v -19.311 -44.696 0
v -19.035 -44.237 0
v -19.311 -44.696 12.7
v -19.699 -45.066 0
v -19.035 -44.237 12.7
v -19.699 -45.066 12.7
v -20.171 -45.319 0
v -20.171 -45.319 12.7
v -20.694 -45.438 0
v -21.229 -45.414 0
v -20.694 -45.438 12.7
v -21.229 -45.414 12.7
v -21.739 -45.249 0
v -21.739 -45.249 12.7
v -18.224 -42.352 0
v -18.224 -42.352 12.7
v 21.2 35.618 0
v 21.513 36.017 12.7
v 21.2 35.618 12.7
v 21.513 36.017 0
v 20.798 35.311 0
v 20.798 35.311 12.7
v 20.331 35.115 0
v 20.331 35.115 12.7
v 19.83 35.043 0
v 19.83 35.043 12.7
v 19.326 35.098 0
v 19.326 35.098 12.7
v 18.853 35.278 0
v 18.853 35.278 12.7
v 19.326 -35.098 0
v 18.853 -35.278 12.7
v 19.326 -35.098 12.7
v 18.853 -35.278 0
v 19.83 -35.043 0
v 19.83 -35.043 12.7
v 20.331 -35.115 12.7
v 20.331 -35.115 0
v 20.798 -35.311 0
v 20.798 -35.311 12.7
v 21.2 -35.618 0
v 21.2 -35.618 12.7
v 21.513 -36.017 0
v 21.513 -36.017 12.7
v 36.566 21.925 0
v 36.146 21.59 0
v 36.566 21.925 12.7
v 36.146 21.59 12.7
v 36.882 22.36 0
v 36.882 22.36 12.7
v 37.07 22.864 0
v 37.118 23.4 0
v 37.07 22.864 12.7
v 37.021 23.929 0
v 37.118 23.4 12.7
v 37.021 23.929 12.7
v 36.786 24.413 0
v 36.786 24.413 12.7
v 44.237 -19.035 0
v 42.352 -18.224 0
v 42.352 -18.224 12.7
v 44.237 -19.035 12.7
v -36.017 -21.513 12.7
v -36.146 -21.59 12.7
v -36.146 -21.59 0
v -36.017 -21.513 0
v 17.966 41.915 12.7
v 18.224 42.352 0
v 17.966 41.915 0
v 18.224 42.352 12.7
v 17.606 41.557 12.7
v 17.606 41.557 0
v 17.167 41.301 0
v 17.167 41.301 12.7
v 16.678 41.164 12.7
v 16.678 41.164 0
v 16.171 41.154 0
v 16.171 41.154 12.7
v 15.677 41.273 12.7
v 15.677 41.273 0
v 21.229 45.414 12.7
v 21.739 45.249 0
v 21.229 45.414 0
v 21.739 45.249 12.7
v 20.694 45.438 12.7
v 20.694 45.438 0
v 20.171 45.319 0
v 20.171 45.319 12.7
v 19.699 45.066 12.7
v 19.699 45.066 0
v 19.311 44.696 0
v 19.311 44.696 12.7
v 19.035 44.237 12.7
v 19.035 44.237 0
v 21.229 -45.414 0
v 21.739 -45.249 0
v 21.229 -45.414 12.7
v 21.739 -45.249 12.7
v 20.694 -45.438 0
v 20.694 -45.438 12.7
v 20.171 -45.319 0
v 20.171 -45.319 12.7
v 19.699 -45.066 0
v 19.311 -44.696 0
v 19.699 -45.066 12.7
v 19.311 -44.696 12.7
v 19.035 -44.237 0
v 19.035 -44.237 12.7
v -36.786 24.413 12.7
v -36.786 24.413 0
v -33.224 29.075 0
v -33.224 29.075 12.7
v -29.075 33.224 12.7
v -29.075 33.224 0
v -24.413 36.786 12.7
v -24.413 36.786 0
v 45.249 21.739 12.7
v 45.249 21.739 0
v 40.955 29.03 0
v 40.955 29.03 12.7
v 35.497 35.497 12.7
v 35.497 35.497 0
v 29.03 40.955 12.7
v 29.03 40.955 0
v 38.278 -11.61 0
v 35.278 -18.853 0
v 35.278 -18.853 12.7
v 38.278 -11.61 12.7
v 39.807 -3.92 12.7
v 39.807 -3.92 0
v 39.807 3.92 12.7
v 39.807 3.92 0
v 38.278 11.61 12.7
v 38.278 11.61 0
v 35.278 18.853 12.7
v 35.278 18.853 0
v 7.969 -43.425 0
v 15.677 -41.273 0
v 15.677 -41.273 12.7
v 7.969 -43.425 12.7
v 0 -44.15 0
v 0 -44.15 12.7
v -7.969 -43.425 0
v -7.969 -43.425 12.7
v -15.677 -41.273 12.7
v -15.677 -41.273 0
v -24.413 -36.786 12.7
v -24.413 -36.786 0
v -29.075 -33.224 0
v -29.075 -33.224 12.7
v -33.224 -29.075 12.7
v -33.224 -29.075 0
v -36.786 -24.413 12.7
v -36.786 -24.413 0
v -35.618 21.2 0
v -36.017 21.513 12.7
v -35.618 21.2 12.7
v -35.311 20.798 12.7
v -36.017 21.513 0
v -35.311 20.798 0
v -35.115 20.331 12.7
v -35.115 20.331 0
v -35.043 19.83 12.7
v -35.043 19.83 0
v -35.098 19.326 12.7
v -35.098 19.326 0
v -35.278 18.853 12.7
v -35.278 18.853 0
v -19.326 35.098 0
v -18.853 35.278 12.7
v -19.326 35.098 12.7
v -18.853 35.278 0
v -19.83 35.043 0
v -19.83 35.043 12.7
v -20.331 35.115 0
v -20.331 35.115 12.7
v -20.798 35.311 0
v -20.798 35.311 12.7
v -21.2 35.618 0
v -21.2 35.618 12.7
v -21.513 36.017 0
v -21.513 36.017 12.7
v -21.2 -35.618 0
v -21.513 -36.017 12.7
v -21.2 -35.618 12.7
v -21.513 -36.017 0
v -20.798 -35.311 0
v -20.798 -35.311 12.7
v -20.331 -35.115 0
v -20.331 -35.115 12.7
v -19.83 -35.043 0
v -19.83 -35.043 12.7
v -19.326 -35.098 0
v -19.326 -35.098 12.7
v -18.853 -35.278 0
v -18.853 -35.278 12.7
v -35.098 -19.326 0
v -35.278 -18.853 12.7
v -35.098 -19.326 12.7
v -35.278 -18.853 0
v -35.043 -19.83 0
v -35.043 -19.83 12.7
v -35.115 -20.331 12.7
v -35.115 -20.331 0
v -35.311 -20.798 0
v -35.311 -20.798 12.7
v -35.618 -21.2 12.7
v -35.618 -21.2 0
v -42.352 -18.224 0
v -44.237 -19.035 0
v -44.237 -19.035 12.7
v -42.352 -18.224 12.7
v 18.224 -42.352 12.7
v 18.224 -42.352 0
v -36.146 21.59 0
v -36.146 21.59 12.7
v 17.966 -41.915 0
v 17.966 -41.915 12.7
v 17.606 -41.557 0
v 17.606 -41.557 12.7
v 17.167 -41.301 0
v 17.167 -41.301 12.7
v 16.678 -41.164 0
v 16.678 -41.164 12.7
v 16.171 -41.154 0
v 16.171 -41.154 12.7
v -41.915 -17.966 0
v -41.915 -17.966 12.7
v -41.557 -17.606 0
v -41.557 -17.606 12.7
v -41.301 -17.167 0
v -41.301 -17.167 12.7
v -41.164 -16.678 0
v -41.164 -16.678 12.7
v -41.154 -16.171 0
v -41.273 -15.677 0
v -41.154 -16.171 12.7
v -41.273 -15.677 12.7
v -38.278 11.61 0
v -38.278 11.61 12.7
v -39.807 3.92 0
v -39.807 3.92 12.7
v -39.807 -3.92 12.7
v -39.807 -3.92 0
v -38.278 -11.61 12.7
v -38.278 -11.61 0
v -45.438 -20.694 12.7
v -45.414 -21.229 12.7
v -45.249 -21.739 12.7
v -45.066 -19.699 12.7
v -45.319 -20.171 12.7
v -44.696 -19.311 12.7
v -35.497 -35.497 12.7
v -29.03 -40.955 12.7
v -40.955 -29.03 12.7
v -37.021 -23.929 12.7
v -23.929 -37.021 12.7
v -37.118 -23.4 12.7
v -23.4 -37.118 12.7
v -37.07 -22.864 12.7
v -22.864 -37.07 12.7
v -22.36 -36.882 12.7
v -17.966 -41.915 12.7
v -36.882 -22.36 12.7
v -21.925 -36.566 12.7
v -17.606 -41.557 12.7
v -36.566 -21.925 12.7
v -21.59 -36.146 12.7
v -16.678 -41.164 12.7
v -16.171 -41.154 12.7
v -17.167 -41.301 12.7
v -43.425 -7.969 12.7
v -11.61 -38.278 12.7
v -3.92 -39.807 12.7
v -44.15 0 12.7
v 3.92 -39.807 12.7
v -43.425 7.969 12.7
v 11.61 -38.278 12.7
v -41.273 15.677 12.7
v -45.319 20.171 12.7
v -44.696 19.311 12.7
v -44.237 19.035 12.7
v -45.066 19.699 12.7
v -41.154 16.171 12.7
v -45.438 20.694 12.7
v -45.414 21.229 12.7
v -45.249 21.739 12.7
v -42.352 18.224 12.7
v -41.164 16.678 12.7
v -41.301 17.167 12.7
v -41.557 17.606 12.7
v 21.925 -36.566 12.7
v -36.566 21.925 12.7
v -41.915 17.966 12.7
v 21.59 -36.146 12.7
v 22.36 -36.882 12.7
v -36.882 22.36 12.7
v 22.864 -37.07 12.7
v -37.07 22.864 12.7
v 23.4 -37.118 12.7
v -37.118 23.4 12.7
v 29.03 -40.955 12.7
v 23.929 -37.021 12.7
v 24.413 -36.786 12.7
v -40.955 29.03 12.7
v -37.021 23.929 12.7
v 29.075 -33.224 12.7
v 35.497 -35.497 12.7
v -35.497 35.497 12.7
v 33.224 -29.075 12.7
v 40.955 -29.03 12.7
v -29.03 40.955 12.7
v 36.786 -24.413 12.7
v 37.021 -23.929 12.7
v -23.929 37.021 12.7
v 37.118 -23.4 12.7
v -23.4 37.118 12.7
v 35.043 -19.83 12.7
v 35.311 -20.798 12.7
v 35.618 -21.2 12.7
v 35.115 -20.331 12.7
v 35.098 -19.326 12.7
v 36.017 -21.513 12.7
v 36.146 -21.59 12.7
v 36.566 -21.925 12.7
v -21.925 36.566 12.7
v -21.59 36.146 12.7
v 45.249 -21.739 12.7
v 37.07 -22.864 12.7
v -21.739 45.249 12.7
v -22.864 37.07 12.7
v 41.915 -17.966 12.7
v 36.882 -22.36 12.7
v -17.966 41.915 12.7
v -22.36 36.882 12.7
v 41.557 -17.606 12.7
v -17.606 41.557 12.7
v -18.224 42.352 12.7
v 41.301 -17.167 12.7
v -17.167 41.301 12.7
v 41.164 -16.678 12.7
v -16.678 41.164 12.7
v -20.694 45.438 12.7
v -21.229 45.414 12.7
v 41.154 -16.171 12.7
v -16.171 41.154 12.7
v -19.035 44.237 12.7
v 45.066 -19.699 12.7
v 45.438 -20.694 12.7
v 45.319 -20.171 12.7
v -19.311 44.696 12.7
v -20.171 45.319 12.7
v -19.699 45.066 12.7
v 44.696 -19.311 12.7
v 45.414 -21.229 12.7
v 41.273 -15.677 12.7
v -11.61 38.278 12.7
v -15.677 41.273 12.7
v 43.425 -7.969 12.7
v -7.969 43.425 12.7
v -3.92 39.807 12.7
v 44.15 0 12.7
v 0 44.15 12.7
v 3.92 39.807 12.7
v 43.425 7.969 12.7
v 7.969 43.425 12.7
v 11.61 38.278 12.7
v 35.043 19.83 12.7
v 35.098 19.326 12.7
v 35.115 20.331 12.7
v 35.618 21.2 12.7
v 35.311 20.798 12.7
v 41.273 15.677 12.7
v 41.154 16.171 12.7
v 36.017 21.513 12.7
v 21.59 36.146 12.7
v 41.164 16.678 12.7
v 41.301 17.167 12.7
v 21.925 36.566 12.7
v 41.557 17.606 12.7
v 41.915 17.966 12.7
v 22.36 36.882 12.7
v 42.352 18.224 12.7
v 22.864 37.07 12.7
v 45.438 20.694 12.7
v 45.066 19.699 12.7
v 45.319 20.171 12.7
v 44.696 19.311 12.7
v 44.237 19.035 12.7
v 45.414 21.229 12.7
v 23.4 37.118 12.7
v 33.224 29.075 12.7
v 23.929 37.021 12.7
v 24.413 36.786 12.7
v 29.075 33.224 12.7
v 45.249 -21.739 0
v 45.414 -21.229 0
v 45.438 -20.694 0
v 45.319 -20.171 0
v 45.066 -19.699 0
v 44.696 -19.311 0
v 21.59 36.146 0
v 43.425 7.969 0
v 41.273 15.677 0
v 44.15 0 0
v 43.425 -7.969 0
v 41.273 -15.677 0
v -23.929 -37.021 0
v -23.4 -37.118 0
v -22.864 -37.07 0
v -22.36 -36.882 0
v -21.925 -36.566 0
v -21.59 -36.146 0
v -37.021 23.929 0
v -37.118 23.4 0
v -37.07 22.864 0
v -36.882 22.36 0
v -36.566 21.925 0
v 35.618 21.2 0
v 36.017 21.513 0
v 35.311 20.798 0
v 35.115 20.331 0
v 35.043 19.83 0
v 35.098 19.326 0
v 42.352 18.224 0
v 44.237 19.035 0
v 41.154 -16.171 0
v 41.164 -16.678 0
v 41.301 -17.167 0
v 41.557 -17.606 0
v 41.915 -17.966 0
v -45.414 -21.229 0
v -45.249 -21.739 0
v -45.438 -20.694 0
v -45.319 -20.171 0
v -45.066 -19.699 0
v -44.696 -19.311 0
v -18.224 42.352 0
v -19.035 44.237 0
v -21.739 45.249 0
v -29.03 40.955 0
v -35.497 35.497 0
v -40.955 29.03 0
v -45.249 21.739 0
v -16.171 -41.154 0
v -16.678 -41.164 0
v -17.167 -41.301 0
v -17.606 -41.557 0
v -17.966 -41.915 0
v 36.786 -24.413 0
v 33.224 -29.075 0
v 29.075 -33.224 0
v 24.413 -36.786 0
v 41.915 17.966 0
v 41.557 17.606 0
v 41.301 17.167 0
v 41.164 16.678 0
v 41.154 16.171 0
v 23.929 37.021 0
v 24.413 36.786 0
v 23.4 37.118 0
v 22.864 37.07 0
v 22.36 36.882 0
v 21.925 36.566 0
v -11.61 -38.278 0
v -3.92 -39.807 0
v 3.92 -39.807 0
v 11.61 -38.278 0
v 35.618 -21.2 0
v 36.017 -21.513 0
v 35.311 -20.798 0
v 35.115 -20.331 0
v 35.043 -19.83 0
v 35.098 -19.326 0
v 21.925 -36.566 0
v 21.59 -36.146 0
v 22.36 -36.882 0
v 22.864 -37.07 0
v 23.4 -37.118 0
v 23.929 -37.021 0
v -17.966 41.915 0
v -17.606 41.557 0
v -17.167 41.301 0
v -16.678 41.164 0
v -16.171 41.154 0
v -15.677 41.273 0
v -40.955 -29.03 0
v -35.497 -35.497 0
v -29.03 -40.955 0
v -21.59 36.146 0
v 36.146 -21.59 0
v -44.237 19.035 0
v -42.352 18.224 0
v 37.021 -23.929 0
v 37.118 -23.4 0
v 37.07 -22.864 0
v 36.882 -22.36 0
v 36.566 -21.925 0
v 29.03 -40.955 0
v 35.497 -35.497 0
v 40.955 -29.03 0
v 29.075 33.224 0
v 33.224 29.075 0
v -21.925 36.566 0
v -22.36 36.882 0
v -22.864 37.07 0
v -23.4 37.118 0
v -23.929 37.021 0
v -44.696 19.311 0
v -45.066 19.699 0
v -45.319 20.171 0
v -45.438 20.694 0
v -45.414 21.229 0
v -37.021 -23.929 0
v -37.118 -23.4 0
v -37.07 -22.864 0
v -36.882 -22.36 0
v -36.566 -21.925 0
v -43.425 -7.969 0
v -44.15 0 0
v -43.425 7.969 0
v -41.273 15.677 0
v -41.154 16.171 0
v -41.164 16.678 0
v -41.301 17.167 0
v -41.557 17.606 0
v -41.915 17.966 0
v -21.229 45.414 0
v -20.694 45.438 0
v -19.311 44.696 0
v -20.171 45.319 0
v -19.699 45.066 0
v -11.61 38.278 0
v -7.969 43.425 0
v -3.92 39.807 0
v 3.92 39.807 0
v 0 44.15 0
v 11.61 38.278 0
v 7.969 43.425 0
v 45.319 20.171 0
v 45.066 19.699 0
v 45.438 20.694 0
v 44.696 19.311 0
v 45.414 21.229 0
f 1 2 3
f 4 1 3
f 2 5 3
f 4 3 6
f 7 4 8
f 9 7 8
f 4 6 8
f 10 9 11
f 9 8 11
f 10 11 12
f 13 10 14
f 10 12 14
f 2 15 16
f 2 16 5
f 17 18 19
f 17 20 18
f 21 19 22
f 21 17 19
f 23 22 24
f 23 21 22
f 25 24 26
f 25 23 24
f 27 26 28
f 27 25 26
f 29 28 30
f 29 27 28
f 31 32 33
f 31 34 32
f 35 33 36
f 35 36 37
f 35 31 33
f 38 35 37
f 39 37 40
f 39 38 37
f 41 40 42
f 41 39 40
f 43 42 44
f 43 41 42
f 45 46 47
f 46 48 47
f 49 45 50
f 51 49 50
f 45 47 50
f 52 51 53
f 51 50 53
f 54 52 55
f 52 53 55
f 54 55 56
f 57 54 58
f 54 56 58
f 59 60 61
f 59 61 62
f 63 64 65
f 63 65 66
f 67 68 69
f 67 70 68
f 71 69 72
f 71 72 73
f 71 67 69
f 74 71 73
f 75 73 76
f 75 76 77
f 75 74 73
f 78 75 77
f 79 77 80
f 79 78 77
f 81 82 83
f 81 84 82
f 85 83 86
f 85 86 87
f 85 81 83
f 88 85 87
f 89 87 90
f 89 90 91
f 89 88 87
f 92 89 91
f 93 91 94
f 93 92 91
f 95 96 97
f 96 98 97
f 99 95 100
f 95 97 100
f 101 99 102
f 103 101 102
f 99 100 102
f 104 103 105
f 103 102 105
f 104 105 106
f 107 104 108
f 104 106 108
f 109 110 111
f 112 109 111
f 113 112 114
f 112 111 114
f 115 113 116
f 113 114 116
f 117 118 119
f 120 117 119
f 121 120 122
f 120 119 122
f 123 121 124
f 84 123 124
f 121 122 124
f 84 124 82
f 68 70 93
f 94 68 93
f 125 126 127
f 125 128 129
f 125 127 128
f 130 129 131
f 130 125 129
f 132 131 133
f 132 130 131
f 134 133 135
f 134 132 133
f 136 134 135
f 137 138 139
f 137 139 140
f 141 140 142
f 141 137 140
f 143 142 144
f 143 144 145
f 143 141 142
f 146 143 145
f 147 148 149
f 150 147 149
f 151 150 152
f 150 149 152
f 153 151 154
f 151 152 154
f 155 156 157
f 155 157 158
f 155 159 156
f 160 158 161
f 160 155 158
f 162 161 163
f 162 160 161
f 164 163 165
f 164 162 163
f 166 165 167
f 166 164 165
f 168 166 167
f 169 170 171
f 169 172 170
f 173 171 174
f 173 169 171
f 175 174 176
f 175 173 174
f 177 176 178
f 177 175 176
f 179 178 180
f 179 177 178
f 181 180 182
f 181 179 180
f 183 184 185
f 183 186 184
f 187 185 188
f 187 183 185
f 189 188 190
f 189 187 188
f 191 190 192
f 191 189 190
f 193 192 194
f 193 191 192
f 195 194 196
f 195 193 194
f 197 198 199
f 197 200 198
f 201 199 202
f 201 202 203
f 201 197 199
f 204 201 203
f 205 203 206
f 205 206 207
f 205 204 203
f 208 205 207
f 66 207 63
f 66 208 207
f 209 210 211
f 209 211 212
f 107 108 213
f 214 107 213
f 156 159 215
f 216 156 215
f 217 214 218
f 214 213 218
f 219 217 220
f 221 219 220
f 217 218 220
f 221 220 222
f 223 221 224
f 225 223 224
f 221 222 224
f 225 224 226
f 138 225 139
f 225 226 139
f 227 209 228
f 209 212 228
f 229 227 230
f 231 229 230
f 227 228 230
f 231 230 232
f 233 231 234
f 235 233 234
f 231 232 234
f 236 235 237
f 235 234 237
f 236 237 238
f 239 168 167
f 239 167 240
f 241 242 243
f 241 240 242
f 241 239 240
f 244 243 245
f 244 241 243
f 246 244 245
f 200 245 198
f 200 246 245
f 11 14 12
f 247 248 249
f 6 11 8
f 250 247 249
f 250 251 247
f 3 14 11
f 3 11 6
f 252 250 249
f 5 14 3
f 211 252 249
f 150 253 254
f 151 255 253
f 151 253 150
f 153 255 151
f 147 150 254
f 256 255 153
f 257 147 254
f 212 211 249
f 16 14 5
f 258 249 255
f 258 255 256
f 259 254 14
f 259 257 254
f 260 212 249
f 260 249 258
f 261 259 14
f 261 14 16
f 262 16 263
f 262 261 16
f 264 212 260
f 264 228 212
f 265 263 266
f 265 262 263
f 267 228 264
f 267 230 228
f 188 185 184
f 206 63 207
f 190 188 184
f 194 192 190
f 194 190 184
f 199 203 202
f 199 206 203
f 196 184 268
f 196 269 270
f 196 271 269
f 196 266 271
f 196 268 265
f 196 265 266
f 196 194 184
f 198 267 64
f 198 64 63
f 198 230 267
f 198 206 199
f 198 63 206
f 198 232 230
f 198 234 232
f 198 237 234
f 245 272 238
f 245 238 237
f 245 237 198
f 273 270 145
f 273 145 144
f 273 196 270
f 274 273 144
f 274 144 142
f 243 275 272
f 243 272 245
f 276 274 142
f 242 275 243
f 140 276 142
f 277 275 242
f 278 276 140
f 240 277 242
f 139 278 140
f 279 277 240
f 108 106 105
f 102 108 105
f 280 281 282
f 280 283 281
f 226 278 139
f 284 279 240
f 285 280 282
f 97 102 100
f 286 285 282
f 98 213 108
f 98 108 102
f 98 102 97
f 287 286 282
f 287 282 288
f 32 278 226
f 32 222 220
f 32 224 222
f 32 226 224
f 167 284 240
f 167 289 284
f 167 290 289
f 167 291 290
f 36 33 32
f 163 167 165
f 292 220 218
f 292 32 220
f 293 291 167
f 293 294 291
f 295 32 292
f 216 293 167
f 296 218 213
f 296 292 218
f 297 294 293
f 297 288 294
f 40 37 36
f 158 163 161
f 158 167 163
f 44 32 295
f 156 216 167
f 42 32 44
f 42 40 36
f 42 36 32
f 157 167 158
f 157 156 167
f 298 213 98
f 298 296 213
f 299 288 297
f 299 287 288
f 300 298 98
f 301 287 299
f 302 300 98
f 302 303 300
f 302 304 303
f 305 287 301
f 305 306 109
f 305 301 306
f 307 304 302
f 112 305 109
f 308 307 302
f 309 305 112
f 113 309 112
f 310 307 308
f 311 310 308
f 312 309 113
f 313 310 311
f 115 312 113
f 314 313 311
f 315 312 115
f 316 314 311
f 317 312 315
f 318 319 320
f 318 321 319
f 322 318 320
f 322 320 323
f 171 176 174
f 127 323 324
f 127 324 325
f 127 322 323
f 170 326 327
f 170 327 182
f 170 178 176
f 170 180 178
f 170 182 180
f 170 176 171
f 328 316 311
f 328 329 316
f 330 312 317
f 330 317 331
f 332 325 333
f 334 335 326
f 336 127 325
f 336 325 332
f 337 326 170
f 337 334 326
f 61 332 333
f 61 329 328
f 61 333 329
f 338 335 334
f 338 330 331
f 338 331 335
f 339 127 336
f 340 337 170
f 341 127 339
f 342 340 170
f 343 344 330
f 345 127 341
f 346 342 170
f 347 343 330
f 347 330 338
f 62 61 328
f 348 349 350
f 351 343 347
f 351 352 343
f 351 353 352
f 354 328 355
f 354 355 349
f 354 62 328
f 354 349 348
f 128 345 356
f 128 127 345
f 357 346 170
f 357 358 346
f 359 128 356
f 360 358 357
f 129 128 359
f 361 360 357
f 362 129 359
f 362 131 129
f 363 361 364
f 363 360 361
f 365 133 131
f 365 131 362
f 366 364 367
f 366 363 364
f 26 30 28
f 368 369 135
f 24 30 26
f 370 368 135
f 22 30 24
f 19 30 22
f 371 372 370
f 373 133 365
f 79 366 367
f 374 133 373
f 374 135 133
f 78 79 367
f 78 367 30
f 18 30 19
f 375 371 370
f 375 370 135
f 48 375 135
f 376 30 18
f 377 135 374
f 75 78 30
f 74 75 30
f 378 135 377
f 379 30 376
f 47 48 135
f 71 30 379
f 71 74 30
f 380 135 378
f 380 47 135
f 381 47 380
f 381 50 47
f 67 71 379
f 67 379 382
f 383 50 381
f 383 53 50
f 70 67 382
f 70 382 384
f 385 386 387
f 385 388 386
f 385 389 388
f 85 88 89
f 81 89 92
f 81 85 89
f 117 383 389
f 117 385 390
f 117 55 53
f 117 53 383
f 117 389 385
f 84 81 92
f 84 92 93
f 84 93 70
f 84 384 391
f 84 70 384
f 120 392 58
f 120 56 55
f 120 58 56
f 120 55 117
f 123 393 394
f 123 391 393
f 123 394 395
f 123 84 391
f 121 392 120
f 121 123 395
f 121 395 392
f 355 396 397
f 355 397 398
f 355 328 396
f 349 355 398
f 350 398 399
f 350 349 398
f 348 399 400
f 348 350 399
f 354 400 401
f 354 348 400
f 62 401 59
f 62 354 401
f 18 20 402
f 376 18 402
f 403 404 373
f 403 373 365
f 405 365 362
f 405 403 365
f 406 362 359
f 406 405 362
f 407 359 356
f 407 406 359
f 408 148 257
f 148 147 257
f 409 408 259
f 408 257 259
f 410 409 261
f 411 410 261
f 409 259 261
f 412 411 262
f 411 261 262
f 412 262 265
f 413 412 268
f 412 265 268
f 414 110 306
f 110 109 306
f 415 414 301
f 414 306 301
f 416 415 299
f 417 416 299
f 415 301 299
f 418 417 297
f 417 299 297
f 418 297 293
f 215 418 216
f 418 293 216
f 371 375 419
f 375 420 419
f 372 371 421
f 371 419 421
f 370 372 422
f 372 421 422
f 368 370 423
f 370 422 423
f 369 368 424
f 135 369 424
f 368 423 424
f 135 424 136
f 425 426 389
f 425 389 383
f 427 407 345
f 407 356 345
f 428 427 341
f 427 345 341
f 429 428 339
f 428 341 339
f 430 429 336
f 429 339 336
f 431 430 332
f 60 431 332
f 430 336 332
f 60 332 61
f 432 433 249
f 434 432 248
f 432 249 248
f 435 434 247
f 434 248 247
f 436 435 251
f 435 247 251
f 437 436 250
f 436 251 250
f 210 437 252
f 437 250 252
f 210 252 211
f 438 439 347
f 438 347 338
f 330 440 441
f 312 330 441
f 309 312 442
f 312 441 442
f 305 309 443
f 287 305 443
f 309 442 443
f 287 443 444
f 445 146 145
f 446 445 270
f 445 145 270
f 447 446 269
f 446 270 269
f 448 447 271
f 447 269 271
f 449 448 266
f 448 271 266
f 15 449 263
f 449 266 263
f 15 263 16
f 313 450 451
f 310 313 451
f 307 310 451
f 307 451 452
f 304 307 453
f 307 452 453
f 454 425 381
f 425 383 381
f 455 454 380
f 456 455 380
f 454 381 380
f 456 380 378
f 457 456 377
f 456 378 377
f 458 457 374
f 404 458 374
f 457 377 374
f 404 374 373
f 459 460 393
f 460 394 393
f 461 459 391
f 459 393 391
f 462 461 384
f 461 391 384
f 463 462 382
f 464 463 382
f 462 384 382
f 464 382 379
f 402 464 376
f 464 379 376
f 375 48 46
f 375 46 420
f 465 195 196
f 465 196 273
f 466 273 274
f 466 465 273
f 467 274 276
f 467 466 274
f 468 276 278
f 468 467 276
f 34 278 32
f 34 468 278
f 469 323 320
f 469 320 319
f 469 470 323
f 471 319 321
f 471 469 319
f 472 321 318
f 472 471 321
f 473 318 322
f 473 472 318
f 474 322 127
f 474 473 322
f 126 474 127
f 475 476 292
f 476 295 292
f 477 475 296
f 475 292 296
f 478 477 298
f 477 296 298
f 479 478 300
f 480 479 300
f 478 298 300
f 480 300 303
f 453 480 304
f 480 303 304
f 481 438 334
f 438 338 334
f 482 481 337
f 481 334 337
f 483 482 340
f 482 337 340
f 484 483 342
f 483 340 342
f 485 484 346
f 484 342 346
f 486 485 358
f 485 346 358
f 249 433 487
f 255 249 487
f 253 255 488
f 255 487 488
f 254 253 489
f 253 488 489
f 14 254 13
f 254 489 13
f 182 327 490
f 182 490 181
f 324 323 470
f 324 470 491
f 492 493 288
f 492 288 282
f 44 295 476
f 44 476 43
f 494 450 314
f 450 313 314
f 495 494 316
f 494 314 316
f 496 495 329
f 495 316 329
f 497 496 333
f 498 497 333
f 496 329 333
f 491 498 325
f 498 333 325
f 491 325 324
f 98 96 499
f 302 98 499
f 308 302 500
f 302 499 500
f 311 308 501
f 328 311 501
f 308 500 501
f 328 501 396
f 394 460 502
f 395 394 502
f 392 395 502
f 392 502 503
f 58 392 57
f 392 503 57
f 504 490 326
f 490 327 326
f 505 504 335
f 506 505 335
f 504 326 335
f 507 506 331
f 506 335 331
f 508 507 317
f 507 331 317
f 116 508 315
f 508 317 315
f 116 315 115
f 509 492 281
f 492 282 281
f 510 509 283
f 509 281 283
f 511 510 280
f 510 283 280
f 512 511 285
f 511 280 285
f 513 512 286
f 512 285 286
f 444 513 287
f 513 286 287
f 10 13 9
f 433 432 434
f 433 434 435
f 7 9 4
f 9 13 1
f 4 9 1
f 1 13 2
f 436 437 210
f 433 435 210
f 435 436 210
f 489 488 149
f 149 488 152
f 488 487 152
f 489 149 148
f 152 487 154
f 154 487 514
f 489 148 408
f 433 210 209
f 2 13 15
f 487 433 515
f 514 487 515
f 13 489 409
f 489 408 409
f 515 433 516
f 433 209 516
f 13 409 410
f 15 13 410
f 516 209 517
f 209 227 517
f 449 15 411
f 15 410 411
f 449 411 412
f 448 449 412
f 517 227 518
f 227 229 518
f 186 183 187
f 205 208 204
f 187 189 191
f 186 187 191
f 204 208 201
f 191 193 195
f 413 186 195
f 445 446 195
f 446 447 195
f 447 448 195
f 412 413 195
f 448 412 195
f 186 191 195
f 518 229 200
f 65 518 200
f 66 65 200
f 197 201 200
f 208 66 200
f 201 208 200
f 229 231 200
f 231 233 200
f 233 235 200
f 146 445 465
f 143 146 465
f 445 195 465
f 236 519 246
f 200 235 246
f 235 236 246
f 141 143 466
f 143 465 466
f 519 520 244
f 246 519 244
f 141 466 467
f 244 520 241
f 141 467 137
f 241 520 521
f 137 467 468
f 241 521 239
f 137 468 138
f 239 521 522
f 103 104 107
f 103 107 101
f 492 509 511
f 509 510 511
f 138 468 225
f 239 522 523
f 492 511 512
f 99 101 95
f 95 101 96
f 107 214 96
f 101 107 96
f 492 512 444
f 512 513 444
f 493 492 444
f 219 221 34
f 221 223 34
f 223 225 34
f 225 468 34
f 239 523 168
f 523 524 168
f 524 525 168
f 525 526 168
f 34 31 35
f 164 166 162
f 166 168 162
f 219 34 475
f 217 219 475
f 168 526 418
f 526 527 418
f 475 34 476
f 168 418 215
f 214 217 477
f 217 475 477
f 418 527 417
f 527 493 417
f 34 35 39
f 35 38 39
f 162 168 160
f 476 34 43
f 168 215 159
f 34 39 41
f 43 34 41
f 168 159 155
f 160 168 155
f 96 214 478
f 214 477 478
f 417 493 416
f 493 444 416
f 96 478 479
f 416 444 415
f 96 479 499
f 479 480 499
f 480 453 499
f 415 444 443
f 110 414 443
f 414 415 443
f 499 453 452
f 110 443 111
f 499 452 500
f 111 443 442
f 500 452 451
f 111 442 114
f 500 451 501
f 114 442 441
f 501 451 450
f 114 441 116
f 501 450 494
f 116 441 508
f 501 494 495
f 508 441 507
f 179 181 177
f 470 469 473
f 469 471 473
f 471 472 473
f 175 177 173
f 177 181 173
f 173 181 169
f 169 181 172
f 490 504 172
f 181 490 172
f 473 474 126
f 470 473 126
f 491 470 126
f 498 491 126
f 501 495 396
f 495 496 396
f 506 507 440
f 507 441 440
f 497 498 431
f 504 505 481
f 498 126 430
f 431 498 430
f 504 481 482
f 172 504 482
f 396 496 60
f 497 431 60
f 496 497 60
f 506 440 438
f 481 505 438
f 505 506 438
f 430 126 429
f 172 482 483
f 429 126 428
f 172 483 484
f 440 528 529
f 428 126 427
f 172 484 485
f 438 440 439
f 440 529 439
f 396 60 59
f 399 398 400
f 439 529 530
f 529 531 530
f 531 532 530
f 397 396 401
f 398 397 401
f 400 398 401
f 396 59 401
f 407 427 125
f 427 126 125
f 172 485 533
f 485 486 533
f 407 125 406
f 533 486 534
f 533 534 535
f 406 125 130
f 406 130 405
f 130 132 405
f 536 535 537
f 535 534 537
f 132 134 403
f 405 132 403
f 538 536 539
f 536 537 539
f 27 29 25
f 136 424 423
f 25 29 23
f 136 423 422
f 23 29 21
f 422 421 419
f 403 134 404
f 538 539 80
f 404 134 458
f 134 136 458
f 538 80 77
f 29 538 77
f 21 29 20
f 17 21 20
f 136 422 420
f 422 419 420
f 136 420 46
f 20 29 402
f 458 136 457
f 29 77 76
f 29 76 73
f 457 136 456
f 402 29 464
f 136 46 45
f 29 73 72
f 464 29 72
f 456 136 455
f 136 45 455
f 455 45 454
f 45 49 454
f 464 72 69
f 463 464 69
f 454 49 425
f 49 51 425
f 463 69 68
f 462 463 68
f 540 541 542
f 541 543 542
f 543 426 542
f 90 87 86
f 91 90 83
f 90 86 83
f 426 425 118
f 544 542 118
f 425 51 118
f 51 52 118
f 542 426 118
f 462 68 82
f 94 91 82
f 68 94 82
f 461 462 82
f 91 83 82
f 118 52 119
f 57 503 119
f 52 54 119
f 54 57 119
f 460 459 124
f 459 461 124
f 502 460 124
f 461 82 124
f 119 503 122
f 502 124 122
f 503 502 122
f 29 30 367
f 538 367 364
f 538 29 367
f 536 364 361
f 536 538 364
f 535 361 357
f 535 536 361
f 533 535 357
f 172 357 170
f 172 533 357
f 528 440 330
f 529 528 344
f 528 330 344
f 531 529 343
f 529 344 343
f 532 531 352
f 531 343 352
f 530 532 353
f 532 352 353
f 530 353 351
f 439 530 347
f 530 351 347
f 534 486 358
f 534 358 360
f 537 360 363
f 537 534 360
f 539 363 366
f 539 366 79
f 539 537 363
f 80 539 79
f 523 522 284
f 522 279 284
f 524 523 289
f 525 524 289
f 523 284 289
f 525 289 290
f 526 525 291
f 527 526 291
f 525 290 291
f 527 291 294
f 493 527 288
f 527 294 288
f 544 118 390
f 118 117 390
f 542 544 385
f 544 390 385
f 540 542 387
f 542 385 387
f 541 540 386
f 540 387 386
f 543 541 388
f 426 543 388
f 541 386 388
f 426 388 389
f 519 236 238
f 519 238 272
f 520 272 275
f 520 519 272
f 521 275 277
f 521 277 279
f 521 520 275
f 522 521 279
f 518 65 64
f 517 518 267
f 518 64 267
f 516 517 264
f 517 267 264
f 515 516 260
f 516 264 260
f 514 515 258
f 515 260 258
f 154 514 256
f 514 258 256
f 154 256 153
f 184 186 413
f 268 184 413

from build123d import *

# Parameters (mm, degrees)
SKETCH1_R                = 50.2
SKETCH1_R_2              = 40
BOSS_EXTRUDE1_DEPTH      = 12.7
CUT_EXTRUDE1_DEPTH       = 13.7
FILLET1_R                = 2
CIRPATTERN1_COUNT        = 4
FILLET1_OF_CIRPATTERN1_R = 2


with BuildPart() as part:
    # Sketch1 → Boss-Extrude1 (new body)
    with BuildSketch(Plane.XY):
        Circle(SKETCH1_R)
        Circle(SKETCH1_R_2, mode=Mode.SUBTRACT)
    extrude(amount=BOSS_EXTRUDE1_DEPTH)

    # Sketch2 → Cut-Extrude1 (cut, through all)
    with BuildSketch(Plane(origin=(0, 0, 0), x_dir=(-1, 0, 0), z_dir=(0, 0, -1))):
        with BuildLine():
            Line((-37.903382312, 22.639702058), (0, 0))
            Line((0, 0), (-22.639702058, 37.903382312))
            ThreePointArc((-22.639702058, 37.903382312), (-31.218764389, 31.218764389), (-37.903382312, 22.639702058))
        make_face()
        with BuildLine():
            Line((-46.112060645, 19.842325042), (-40.554730627, 17.450969136))
            ThreePointArc((-40.554730627, 17.450969136), (-44.15, 0), (-40.554730627, -17.450969136))
            Line((-40.554730627, -17.450969136), (-46.112060645, -19.842325042))
            ThreePointArc((-46.112060645, -19.842325042), (-50.2, 0), (-46.112060645, 19.842325042))
        make_face()
    cut_extrude1 = extrude(amount=-CUT_EXTRUDE1_DEPTH, mode=Mode.SUBTRACT)

    # Fillet1
    fillet1_edges = [part.edges().sort_by_distance(p)[0] for p in [
        (34.340550226, 20.511621344, 6.35),
        (20.511621344, 34.340550226, 6.35),
        (22.639702058, 37.903382312, 6.35),
        (37.903382312, 22.639702058, 6.35),
        (40.554730627, 17.450969136, 6.35),
        (40.554730627, -17.450969136, 6.35),
        (46.112060645, -19.842325042, 6.35),
        (46.112060645, 19.842325042, 6.35),
    ]]
    fillet(fillet1_edges, radius=FILLET1_R)

    # CirPattern1: Cut-Extrude1 ×4 about axis
    cirpattern1_axis = Axis((0, 0, 0), (0, 0, 1))
    for i in range(1, CIRPATTERN1_COUNT):
        add(cut_extrude1.rotate(cirpattern1_axis, i * 360 / CIRPATTERN1_COUNT), mode=Mode.SUBTRACT)

    # Fillet1 of CirPattern1
    fillet1_of_cirpattern1_edges = [part.edges().sort_by_distance(p)[0] for p in [
        (-20.511621344, 34.340550226, 6.35),
        (-34.340550226, 20.511621344, 6.35),
        (-37.903382312, 22.639702058, 6.35),
        (-22.639702058, 37.903382312, 6.35),
        (-17.450969136, 40.554730627, 6.35),
        (17.450969136, 40.554730627, 6.35),
        (19.842325042, 46.112060645, 6.35),
        (-19.842325042, 46.112060645, 6.35),
        (-34.340550226, -20.511621344, 6.35),
        (-20.511621344, -34.340550226, 6.35),
        (-22.639702058, -37.903382312, 6.35),
        (-37.903382312, -22.639702058, 6.35),
        (-40.554730627, -17.450969136, 6.35),
        (-40.554730627, 17.450969136, 6.35),
        (-46.112060645, 19.842325042, 6.35),
        (-46.112060645, -19.842325042, 6.35),
        (20.511621344, -34.340550226, 6.35),
        (34.340550226, -20.511621344, 6.35),
        (37.903382312, -22.639702058, 6.35),
        (22.639702058, -37.903382312, 6.35),
        (17.450969136, -40.554730627, 6.35),
        (-17.450969136, -40.554730627, 6.35),
        (-19.842325042, -46.112060645, 6.35),
        (19.842325042, -46.112060645, 6.35),
    ]]
    fillet(fillet1_of_cirpattern1_edges, radius=FILLET1_OF_CIRPATTERN1_R)


solid = part.part
